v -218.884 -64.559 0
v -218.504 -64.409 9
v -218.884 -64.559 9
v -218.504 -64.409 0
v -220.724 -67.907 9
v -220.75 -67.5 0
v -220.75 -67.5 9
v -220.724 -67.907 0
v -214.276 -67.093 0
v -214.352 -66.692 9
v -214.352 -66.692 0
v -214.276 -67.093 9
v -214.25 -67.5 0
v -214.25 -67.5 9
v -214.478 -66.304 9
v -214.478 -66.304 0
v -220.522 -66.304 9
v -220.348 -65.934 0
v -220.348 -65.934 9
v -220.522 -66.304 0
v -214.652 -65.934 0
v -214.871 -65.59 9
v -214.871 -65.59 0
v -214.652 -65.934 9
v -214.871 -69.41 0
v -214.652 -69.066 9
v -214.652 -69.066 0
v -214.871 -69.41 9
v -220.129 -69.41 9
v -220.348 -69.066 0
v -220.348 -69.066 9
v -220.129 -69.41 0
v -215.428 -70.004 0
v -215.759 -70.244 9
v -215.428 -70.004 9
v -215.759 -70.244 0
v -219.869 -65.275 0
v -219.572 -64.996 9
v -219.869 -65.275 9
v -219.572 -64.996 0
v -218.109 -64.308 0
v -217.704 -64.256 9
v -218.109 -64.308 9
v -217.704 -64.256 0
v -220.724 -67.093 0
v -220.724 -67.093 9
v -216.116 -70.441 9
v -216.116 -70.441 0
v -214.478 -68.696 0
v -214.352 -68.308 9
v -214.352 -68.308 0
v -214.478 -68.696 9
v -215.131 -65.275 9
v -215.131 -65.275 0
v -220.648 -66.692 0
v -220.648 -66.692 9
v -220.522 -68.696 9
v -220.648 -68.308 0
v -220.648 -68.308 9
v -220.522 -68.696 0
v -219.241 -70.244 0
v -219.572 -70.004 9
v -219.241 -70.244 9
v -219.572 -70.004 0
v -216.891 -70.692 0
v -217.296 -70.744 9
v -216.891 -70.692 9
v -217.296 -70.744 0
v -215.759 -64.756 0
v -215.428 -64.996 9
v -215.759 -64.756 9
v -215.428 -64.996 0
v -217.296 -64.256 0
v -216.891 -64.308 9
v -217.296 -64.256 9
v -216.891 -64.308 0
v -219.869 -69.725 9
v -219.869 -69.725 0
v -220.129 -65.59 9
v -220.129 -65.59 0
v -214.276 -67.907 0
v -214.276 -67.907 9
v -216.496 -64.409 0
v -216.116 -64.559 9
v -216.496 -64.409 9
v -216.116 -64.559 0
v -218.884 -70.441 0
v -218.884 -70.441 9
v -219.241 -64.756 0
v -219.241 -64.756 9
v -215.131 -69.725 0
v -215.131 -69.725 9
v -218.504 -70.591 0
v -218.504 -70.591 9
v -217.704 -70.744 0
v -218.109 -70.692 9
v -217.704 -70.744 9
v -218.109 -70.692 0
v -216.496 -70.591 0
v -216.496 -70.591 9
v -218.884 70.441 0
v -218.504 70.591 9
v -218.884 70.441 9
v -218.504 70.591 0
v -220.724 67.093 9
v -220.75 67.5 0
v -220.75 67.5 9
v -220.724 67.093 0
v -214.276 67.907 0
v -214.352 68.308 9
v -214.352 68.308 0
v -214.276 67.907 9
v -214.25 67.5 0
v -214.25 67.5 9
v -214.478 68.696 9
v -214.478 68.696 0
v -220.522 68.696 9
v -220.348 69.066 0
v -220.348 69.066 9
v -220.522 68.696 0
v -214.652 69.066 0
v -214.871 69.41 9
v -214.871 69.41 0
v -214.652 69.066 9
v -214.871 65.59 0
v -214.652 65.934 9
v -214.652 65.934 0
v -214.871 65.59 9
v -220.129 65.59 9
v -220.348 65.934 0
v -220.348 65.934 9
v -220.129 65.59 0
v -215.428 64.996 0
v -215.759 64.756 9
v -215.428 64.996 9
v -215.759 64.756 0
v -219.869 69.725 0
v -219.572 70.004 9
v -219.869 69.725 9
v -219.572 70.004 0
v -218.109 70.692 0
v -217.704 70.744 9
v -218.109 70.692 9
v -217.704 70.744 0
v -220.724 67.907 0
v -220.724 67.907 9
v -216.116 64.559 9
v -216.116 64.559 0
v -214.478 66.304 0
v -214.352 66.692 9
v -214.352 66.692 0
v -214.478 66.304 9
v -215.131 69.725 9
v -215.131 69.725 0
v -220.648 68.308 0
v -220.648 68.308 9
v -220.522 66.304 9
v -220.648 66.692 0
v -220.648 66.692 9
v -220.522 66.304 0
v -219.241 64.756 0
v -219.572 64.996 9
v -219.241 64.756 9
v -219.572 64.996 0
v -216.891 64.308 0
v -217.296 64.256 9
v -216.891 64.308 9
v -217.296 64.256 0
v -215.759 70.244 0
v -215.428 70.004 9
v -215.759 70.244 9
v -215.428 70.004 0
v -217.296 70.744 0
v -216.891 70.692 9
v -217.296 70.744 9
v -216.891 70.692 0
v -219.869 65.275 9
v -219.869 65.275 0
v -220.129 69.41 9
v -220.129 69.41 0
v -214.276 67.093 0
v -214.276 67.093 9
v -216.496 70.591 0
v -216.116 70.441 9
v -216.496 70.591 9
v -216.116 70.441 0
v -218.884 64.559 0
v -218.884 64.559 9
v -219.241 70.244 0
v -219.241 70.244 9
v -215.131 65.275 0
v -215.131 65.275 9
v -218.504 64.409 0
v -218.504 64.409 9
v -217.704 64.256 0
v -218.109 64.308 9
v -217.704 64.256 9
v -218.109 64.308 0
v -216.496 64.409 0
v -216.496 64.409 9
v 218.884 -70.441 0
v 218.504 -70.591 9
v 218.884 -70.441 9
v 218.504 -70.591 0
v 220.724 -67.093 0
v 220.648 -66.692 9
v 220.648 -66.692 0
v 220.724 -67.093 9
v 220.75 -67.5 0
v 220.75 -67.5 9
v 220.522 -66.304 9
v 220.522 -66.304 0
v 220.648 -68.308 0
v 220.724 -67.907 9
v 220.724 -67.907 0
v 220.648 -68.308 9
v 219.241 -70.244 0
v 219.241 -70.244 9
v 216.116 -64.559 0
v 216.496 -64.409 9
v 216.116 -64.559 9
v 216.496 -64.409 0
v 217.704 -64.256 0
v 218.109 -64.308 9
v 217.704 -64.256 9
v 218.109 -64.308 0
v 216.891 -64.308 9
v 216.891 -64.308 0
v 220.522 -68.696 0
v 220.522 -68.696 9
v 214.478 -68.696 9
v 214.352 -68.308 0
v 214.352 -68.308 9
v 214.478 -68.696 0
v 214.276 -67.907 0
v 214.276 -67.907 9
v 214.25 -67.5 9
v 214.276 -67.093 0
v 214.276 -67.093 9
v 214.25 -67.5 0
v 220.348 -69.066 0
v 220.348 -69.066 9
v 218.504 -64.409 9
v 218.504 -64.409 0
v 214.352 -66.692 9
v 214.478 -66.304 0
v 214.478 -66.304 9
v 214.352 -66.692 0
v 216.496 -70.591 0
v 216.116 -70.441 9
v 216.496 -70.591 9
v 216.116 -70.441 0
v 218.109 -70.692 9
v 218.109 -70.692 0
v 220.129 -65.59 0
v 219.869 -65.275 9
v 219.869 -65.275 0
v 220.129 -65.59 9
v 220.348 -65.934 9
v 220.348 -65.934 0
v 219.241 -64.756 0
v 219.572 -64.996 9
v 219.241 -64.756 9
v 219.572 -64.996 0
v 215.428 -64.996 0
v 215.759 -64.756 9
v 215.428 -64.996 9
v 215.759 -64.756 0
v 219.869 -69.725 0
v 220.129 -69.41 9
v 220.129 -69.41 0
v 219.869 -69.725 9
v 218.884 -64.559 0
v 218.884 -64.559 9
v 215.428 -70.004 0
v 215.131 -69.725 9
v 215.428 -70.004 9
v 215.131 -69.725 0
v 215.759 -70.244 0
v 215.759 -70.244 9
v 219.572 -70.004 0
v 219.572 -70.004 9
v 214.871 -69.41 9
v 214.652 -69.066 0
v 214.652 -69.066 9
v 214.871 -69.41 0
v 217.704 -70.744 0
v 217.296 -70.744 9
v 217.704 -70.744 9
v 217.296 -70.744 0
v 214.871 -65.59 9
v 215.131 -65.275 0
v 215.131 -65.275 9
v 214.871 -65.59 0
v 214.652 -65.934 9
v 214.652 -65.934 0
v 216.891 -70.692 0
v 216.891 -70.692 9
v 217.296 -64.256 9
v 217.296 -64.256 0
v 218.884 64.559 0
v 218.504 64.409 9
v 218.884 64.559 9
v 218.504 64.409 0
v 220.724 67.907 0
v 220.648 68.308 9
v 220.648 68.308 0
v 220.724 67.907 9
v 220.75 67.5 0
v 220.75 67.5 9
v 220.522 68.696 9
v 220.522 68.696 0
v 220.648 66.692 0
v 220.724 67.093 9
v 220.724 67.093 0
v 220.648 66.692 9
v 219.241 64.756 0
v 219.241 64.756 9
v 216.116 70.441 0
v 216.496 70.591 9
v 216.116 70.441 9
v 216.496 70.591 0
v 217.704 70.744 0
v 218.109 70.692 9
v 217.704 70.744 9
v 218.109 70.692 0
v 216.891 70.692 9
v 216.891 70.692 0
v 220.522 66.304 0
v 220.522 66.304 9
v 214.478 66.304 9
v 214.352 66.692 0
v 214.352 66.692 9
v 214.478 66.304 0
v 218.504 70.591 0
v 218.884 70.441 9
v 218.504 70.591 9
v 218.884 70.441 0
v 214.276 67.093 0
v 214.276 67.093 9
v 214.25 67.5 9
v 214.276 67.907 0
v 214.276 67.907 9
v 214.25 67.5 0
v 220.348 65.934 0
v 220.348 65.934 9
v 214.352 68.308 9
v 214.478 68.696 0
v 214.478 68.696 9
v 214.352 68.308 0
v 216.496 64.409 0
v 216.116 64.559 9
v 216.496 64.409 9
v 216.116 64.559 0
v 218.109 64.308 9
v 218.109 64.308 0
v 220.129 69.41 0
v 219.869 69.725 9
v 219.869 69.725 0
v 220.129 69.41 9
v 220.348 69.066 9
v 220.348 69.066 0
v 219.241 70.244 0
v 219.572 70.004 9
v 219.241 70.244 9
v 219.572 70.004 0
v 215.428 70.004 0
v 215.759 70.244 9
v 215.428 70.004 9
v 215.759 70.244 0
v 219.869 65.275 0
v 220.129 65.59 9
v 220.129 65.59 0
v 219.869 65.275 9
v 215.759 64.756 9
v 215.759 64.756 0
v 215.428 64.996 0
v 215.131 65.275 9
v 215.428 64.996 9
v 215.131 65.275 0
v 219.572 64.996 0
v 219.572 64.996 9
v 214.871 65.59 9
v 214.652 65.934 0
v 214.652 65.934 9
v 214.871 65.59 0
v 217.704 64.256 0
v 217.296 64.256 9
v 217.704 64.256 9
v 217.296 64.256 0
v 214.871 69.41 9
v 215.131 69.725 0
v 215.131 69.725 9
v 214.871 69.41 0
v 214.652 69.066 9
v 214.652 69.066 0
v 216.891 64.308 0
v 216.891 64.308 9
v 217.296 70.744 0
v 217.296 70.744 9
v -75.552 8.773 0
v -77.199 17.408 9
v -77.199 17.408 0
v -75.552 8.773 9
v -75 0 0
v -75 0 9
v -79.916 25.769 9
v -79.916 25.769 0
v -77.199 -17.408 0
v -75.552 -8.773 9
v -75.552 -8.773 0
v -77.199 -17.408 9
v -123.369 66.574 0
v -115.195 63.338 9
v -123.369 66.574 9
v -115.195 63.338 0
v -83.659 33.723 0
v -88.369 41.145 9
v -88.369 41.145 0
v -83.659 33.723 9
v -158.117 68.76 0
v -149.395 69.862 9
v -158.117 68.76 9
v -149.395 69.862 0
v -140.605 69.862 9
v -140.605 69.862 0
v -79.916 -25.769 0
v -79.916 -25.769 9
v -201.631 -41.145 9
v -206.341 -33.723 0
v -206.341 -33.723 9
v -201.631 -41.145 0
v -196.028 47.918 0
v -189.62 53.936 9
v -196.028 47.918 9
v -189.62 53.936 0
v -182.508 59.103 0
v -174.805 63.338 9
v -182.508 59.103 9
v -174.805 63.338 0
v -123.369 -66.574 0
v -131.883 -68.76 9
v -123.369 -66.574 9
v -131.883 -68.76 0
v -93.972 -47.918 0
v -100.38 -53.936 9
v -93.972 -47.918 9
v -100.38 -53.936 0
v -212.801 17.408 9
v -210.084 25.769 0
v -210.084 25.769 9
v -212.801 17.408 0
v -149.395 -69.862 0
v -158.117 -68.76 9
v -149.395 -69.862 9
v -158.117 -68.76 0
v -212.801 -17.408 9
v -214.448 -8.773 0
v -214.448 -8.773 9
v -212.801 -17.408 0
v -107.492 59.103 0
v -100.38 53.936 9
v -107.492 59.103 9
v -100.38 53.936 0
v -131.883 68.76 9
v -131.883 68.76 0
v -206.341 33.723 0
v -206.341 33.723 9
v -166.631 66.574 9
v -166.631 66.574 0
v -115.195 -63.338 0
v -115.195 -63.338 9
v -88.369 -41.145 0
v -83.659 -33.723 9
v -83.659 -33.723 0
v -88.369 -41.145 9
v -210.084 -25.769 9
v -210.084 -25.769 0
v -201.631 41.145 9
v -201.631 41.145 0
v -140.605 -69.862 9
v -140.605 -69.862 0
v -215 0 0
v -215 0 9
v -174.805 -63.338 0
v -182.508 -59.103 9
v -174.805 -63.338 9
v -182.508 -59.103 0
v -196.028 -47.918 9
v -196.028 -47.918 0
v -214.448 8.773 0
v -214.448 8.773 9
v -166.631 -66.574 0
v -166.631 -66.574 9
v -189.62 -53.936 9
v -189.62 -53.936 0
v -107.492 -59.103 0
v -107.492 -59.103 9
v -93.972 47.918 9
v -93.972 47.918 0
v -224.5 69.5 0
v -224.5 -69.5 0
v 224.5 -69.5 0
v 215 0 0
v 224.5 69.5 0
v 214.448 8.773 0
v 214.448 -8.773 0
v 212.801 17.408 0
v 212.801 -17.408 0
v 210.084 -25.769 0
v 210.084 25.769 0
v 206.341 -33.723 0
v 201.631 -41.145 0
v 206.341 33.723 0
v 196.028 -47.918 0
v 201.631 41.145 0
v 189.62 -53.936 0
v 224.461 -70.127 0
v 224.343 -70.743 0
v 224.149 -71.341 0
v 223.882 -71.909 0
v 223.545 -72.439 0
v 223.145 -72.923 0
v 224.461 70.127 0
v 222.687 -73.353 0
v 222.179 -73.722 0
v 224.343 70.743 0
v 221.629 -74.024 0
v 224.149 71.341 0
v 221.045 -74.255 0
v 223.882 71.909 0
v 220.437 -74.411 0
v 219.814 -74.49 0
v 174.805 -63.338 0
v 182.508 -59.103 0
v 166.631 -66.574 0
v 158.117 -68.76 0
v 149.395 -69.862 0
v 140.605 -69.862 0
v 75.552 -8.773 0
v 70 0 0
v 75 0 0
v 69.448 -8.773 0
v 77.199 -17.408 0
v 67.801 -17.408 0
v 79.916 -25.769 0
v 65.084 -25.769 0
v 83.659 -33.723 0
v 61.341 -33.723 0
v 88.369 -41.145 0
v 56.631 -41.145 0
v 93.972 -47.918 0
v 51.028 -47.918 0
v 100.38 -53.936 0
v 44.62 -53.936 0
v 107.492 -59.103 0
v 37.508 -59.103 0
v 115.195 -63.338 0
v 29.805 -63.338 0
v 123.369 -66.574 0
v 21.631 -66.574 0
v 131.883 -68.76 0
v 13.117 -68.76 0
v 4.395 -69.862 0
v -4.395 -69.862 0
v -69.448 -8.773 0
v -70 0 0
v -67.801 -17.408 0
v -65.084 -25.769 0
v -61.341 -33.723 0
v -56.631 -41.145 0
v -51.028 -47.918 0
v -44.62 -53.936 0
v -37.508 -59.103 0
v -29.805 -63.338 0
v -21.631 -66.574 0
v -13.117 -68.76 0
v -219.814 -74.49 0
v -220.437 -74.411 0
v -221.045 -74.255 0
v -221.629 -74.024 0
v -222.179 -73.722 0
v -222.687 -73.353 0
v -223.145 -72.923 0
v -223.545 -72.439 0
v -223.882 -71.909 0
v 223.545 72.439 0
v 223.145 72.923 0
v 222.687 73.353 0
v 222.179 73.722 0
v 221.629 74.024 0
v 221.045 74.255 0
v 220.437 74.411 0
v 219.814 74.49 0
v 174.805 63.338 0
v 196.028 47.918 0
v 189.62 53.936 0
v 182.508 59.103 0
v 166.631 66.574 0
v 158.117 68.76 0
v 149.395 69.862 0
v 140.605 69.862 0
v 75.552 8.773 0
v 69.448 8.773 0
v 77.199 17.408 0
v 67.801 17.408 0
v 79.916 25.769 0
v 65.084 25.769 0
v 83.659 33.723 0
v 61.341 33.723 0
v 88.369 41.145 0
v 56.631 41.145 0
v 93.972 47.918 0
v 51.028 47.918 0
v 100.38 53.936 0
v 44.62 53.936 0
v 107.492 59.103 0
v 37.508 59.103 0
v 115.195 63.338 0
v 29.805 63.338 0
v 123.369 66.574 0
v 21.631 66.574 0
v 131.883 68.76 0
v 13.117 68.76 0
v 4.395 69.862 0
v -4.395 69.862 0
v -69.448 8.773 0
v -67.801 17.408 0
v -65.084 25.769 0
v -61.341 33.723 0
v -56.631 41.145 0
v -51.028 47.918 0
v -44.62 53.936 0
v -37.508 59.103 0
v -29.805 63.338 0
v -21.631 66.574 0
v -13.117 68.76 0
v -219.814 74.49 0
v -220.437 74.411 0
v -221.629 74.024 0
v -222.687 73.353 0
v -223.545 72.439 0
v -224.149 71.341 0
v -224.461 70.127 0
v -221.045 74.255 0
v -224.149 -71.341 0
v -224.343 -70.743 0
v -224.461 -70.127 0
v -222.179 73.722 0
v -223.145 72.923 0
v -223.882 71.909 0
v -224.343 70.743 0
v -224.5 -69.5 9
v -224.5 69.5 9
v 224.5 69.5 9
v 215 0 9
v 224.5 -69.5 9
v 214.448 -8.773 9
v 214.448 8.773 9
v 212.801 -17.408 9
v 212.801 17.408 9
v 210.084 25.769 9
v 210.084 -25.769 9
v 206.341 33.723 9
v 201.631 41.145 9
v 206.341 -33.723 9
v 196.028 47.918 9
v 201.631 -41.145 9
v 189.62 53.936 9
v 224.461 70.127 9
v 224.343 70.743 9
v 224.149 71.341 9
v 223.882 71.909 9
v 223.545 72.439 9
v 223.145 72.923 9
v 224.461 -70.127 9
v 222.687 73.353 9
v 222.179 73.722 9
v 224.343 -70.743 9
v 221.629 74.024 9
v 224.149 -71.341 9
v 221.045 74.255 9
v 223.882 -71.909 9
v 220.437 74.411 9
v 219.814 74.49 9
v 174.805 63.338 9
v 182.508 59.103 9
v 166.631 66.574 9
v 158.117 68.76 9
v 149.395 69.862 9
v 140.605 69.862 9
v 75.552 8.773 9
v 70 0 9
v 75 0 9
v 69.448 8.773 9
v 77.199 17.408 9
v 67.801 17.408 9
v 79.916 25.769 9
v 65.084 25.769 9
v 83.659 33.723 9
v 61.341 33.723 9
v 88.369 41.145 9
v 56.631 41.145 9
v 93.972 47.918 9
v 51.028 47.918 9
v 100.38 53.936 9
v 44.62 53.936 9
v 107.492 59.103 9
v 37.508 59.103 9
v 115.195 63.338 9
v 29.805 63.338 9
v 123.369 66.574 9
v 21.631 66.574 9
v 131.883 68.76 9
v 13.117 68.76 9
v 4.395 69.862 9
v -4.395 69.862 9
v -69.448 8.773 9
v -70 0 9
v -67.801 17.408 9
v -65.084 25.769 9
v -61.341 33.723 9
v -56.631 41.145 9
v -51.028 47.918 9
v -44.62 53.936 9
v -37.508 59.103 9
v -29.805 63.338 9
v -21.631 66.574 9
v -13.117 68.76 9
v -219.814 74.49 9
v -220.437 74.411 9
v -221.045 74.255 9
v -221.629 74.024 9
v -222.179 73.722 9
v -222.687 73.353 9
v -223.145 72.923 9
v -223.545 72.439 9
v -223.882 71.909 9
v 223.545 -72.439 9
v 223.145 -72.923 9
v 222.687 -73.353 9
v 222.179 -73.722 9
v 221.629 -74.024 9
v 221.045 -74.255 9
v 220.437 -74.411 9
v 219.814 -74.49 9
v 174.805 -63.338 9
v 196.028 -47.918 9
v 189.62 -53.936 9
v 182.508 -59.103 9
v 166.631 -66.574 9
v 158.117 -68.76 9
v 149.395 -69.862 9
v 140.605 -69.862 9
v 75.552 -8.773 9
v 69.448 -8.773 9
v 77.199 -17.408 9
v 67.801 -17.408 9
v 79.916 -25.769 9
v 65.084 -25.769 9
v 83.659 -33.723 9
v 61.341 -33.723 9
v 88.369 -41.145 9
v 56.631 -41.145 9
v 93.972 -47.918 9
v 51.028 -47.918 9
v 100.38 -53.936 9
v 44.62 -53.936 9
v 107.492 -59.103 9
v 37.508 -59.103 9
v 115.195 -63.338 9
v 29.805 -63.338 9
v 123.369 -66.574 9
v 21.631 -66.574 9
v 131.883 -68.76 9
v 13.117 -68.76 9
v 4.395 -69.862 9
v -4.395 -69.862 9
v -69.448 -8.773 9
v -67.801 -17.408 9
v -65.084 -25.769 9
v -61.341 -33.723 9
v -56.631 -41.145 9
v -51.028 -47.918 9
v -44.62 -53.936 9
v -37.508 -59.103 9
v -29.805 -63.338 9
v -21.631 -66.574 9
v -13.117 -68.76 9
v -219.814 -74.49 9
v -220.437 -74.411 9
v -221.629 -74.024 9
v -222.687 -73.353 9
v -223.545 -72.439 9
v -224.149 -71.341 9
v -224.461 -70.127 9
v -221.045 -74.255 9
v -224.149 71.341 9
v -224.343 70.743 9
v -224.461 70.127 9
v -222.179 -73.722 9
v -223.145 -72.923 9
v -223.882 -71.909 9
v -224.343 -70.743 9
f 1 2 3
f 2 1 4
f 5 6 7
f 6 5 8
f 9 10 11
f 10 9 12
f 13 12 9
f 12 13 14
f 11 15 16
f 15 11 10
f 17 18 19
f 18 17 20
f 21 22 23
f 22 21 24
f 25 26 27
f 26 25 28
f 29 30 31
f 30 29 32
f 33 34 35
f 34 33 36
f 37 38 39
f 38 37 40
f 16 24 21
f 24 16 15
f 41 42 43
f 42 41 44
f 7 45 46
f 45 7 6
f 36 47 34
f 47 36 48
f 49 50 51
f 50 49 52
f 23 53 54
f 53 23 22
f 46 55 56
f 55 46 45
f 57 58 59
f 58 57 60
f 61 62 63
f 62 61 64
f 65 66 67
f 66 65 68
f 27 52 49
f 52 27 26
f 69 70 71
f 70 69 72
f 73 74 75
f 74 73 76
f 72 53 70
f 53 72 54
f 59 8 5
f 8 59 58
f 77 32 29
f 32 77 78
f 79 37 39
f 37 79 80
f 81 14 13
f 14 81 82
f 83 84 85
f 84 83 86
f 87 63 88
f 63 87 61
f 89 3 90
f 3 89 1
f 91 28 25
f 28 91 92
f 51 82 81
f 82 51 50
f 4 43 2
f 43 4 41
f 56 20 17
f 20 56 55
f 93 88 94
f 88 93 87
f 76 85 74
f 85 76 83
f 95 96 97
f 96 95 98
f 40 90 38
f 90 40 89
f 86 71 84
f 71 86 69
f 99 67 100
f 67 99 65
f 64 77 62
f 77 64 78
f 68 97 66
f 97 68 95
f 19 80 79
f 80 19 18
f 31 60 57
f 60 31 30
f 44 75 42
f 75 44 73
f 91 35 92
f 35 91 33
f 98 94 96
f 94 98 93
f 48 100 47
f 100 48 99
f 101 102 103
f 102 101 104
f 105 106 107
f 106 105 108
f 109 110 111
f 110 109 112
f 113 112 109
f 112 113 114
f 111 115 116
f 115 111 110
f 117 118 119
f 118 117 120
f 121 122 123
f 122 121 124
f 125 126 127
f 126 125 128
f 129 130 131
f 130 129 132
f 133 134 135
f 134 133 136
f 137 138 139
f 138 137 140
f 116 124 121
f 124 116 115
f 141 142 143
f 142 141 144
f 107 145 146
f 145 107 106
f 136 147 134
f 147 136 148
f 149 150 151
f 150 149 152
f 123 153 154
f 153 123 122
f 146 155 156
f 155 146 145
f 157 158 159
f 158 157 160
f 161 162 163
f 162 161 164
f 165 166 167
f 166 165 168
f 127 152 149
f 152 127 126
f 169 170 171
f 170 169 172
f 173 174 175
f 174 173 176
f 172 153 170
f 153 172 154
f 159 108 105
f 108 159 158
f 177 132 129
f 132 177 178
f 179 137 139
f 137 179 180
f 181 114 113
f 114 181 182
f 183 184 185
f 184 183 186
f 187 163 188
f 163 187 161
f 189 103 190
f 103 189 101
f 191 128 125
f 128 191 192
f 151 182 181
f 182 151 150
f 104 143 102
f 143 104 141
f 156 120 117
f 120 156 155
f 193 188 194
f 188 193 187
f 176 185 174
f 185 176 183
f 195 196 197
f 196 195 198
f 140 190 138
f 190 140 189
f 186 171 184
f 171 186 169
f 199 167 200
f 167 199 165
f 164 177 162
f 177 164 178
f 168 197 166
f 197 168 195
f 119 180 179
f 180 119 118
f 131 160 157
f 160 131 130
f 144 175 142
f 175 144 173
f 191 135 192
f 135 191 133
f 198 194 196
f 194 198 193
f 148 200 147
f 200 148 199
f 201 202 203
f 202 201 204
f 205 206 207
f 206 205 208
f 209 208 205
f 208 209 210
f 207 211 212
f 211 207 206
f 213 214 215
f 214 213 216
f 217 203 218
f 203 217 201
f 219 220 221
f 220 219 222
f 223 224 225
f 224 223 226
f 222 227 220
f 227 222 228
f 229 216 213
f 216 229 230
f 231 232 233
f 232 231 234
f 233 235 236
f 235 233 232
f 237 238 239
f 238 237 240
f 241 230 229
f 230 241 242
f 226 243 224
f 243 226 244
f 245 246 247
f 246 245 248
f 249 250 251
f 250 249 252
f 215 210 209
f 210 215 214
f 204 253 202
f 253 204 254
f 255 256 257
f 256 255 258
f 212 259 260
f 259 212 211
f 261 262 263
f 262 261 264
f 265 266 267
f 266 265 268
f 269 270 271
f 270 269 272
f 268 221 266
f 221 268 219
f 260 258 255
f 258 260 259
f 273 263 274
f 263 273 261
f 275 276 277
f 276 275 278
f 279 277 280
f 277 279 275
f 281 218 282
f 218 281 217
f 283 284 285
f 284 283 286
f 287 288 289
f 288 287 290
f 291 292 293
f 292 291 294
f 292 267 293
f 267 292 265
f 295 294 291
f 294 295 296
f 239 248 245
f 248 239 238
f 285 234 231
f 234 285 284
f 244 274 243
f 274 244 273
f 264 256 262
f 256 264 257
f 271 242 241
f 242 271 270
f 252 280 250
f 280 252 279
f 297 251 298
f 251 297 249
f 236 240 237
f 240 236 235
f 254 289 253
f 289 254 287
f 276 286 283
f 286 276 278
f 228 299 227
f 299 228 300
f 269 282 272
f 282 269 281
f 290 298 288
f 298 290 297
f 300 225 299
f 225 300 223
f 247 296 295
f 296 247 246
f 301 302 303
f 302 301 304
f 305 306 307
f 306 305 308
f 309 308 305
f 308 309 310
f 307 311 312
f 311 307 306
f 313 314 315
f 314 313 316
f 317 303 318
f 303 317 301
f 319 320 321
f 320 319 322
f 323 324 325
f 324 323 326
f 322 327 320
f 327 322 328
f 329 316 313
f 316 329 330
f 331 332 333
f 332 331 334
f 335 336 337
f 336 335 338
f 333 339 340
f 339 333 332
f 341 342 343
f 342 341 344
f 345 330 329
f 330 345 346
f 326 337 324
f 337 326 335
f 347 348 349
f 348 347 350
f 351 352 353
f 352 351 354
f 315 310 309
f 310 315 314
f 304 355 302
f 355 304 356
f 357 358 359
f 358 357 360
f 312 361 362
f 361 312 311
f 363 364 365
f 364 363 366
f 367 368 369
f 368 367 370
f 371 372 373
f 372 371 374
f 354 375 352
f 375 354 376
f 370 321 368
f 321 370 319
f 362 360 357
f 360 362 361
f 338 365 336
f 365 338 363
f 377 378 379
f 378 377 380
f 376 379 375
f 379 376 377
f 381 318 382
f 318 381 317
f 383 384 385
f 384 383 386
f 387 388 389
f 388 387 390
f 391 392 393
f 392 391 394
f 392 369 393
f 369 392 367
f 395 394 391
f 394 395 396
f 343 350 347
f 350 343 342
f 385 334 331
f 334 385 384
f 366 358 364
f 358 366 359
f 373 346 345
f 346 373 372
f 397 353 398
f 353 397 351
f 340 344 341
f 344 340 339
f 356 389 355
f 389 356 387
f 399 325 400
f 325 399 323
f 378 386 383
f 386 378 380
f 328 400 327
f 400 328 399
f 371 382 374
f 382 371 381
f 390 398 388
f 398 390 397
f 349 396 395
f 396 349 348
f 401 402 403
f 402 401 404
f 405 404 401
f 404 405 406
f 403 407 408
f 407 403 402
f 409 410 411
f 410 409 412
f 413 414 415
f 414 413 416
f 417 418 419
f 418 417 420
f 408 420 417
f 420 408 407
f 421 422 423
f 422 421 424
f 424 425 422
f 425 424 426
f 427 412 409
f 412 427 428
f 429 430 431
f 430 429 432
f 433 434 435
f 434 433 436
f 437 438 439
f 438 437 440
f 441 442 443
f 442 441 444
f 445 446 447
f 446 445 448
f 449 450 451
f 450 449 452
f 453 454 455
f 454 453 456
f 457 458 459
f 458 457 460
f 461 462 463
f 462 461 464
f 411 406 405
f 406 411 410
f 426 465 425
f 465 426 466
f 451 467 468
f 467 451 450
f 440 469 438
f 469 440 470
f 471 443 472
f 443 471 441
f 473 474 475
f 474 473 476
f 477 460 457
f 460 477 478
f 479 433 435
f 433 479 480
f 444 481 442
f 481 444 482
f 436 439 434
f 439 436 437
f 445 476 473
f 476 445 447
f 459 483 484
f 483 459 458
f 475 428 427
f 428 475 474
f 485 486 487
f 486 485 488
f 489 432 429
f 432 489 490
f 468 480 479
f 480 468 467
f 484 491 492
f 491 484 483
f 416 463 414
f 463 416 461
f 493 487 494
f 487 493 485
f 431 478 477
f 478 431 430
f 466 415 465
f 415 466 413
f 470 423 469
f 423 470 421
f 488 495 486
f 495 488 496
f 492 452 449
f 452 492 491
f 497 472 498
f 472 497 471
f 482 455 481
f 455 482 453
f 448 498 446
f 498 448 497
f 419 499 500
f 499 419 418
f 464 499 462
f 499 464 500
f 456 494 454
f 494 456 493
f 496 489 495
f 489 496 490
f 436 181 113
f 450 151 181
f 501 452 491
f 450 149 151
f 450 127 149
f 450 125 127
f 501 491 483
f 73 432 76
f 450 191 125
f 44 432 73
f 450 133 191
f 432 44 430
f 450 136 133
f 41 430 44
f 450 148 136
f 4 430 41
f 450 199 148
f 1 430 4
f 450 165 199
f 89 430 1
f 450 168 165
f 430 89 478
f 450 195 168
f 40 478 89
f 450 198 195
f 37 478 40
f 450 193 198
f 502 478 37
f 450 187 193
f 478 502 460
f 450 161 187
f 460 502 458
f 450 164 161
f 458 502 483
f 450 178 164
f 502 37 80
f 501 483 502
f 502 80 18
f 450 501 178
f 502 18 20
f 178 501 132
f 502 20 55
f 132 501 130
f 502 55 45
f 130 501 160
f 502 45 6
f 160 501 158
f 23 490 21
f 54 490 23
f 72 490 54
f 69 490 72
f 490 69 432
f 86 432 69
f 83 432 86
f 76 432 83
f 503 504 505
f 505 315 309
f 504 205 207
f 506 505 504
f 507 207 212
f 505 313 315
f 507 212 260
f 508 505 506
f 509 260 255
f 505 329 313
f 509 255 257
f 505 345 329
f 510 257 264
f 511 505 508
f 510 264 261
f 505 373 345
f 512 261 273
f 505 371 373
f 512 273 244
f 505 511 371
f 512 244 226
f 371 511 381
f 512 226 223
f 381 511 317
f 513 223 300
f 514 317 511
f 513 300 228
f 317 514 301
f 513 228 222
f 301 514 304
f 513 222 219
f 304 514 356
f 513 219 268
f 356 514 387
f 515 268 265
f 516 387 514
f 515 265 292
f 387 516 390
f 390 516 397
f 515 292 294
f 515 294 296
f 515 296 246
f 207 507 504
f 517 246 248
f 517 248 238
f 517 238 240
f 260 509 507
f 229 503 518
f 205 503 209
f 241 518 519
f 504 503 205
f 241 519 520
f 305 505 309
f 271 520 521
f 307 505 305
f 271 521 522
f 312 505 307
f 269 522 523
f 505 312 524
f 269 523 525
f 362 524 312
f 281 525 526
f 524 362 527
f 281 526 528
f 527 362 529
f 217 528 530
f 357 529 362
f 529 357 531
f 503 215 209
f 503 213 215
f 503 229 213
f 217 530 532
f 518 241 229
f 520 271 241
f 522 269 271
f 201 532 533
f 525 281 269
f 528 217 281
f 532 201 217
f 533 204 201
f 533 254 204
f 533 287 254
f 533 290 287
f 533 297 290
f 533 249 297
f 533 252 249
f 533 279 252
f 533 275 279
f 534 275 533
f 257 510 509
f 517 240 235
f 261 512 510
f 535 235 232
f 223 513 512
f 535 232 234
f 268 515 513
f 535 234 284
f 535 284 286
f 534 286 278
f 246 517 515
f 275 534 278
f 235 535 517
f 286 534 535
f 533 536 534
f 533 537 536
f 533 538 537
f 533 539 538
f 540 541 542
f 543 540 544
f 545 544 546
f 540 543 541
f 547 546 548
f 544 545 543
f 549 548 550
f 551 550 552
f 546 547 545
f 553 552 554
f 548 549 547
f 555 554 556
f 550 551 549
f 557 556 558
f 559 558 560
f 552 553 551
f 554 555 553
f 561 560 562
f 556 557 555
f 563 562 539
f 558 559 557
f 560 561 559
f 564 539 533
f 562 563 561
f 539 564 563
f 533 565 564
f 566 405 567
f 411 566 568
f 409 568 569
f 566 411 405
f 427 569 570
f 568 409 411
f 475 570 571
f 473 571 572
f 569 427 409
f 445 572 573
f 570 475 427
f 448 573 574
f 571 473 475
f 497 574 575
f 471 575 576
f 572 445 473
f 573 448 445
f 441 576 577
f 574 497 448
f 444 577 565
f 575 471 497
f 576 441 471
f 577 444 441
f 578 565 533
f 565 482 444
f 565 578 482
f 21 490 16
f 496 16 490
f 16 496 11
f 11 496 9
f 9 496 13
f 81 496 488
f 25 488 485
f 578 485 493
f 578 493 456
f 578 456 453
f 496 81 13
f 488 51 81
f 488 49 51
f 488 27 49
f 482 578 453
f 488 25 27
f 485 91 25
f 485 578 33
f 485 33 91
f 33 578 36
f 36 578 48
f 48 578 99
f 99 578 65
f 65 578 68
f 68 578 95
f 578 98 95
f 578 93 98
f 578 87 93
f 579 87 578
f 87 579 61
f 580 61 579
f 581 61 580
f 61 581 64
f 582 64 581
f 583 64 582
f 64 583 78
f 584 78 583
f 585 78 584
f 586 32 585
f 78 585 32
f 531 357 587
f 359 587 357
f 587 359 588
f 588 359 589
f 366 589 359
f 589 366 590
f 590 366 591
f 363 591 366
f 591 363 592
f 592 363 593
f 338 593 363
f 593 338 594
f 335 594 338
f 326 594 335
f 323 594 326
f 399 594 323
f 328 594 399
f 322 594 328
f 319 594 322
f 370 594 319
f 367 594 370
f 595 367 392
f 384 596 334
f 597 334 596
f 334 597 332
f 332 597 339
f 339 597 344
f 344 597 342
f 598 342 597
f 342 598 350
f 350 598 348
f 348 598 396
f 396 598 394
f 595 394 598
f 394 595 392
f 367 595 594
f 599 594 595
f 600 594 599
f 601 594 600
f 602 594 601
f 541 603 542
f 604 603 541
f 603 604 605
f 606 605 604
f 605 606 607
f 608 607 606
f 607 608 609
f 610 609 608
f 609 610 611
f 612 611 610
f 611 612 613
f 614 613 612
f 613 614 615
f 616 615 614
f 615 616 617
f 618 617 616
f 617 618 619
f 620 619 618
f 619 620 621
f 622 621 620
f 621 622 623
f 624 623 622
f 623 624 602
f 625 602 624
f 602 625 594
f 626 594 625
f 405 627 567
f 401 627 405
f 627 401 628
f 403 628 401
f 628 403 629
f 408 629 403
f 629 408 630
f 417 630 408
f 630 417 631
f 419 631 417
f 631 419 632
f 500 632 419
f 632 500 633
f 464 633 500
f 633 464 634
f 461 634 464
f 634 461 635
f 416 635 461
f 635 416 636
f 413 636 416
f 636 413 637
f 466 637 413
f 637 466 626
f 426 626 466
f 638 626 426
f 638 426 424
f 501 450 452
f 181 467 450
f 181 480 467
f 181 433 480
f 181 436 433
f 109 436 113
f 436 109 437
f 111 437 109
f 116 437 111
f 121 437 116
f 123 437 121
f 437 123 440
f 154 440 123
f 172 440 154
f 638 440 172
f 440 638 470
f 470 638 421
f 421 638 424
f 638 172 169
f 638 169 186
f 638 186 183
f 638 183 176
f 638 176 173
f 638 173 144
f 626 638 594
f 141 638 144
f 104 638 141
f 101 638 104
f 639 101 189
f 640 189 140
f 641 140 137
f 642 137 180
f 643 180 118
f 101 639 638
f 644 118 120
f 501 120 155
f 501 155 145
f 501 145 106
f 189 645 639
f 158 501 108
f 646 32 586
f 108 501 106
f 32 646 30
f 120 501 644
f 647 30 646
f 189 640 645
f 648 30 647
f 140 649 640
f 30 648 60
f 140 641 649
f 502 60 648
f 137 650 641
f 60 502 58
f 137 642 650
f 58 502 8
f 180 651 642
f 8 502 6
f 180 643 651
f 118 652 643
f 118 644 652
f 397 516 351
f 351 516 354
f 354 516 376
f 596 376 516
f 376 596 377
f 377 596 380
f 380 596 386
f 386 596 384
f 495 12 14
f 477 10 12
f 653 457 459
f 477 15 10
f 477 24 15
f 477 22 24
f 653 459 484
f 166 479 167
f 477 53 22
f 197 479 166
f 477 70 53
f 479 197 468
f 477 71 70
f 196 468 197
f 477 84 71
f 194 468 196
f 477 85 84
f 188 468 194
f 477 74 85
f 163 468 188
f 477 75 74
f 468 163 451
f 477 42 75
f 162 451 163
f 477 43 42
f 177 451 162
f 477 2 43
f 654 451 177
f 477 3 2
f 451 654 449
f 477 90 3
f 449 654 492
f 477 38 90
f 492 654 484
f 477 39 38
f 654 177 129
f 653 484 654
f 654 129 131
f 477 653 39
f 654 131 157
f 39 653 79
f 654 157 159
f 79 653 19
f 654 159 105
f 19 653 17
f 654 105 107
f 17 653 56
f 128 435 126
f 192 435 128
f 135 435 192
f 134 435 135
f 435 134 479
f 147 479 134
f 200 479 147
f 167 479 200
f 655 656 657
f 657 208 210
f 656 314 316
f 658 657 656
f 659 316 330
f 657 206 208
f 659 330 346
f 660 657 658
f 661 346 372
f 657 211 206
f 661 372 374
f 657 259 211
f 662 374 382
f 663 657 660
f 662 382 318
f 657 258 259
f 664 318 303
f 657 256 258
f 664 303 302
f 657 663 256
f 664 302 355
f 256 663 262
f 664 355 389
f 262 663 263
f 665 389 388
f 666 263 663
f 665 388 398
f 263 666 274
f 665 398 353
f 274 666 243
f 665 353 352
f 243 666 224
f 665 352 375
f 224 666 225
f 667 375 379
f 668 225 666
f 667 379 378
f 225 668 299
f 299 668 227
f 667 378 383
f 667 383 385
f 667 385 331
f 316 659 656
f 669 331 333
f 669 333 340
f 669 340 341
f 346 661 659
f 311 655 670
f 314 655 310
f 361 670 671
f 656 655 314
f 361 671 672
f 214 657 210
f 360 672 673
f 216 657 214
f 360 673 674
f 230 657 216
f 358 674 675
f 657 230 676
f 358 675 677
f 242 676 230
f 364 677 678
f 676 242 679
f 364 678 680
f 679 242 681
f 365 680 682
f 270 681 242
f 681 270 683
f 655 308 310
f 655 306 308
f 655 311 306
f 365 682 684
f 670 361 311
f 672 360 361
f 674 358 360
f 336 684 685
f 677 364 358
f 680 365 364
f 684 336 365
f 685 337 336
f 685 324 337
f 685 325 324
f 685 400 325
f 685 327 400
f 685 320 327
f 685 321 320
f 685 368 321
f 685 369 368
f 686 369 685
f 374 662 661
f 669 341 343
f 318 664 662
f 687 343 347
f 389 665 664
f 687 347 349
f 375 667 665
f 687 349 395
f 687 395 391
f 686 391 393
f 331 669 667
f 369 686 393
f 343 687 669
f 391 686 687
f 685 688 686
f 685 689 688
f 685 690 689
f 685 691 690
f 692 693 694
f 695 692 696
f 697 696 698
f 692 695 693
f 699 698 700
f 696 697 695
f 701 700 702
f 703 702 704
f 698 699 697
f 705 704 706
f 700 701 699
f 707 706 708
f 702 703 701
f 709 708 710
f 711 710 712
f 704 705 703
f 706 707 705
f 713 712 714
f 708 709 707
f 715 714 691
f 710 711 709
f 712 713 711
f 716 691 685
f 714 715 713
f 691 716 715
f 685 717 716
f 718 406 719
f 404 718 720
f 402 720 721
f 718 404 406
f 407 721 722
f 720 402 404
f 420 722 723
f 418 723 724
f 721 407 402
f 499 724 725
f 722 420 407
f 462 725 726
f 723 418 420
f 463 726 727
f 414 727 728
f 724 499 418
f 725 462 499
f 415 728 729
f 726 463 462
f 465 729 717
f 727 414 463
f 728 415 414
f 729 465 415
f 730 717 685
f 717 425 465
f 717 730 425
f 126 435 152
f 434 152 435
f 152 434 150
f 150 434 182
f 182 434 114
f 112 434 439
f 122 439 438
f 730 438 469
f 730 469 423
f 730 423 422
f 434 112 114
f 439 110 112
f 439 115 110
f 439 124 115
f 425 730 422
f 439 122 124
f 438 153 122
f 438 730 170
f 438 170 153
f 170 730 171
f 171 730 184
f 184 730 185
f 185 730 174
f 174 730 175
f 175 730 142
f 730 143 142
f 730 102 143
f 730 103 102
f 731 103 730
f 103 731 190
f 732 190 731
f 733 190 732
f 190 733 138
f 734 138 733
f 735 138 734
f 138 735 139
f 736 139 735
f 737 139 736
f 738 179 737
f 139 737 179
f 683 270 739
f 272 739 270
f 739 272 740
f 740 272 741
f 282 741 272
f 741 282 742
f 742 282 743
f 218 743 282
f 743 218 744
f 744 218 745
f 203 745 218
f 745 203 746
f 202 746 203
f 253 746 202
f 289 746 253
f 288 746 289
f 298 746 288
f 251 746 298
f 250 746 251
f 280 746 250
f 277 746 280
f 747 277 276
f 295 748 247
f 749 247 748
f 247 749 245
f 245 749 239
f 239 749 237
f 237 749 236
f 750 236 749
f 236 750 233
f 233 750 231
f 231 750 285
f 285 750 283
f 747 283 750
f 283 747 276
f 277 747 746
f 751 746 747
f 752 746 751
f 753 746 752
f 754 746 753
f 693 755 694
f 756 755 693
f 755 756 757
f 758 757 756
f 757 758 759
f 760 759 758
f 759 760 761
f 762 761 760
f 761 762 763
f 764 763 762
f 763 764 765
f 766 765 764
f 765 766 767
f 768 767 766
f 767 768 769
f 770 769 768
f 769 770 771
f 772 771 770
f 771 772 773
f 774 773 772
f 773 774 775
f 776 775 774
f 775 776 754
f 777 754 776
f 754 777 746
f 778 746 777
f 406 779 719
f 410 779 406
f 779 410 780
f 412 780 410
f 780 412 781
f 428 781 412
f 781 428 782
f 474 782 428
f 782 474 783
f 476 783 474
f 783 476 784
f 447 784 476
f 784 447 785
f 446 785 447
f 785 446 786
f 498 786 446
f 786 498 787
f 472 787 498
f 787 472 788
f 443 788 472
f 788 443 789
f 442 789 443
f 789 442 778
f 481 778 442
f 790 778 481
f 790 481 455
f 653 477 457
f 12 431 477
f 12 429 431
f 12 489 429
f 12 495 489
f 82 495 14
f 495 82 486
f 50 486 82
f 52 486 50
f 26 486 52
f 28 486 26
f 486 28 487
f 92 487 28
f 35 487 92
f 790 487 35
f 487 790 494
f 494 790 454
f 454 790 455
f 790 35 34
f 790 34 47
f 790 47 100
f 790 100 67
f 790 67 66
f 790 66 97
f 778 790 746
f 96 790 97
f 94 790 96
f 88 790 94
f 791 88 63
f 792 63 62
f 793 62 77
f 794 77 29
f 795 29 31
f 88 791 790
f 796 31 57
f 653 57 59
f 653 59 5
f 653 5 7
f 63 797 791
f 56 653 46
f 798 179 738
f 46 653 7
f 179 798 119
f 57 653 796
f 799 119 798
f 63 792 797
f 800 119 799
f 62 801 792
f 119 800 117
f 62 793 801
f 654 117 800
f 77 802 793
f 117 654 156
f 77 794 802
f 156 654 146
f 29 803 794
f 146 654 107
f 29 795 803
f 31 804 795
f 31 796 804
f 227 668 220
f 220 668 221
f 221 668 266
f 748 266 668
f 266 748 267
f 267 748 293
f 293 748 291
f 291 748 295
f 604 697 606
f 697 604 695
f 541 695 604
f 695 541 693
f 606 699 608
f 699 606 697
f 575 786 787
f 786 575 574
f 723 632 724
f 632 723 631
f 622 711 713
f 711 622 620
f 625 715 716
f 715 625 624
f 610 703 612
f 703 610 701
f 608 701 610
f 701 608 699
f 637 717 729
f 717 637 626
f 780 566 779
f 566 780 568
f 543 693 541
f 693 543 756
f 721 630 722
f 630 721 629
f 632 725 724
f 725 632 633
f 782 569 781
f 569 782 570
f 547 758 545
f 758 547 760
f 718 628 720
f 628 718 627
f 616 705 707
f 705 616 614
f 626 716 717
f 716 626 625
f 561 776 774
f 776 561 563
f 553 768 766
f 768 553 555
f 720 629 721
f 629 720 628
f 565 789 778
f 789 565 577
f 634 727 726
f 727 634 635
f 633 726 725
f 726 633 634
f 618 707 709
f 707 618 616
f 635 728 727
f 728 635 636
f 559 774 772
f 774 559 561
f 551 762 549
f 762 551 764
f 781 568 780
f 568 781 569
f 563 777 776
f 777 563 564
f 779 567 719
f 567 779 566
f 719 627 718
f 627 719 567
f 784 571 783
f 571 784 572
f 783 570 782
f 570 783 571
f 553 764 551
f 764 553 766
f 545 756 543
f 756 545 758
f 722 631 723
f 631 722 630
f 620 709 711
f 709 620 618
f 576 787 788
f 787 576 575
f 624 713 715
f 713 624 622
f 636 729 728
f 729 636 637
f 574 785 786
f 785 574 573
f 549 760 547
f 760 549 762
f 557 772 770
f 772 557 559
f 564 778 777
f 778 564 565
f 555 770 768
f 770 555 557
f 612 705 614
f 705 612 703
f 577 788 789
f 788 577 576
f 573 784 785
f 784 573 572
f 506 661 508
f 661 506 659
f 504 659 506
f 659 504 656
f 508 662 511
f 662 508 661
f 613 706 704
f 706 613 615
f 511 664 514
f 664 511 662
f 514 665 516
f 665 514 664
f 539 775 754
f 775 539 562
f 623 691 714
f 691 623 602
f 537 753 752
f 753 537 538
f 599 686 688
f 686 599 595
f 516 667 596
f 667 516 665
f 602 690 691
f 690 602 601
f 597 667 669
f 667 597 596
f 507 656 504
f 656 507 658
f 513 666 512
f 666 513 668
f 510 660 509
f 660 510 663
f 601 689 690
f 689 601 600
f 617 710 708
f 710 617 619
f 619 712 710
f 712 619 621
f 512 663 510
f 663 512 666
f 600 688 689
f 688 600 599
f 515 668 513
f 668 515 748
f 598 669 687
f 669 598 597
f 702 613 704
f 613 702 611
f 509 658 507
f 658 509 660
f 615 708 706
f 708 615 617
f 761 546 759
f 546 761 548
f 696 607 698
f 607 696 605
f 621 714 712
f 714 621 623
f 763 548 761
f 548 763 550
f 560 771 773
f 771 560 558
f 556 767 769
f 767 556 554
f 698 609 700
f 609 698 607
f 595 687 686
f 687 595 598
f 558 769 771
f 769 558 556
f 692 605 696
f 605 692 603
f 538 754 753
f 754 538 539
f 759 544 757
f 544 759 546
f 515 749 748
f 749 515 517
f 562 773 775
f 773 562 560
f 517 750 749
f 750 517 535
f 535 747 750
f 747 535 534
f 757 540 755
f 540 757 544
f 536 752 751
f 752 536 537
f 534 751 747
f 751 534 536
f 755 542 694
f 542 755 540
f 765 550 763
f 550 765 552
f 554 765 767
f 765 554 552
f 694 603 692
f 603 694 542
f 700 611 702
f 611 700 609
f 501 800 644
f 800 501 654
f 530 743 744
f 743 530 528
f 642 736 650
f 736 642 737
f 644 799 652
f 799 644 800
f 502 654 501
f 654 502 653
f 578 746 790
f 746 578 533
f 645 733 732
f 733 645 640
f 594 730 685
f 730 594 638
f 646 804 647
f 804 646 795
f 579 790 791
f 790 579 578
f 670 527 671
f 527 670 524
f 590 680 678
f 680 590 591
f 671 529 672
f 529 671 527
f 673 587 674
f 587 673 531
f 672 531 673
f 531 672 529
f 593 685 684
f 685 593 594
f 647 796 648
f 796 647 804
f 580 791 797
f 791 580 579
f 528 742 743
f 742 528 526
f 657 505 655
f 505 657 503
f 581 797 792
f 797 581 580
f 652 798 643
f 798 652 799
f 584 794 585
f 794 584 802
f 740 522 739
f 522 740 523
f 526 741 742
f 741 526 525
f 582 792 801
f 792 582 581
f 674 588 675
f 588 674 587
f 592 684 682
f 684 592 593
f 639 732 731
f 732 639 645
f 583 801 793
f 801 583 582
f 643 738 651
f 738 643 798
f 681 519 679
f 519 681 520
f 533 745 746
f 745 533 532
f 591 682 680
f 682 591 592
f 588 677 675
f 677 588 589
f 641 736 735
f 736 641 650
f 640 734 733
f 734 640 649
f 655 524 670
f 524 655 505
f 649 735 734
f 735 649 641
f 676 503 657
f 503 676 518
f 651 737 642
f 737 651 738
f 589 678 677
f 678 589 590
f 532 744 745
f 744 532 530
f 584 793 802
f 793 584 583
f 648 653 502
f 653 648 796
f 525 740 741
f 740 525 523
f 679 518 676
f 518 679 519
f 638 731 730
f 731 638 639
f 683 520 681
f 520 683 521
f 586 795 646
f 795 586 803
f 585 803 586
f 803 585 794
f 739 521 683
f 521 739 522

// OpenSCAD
$fn = 50;

difference() {
	union() {
		hull() {
			translate(v = [-219.5, 69.5, 0]) {
				cylinder(h = 9, r = 5);
			}
			translate(v = [219.5, 69.5, 0]) {
				cylinder(h = 9, r = 5);
			}
			translate(v = [-219.5, -69.5, 0]) {
				cylinder(h = 9, r = 5);
			}
			translate(v = [219.5, -69.5, 0]) {
				cylinder(h = 9, r = 5);
			}
		}
	}
	union() {
		translate(v = [-217.5, -67.5, -100.0]) {
			cylinder(h = 200, r = 3.25);
		}
		translate(v = [-217.5, 67.5, -100.0]) {
			cylinder(h = 200, r = 3.25);
		}
		translate(v = [217.5, -67.5, -100.0]) {
			cylinder(h = 200, r = 3.25);
		}
		translate(v = [217.5, 67.5, -100.0]) {
			cylinder(h = 200, r = 3.25);
		}
		translate(v = [-217.5, -67.5, -100.0]) {
			cylinder(h = 200, r = 1.8);
		}
		translate(v = [-217.5, 67.5, -100.0]) {
			cylinder(h = 200, r = 1.8);
		}
		translate(v = [217.5, -67.5, -100.0]) {
			cylinder(h = 200, r = 1.8);
		}
		translate(v = [217.5, 67.5, -100.0]) {
			cylinder(h = 200, r = 1.8);
		}
		translate(v = [-145.0, 0, 0.0]) {
			cylinder(h = 9, r = 70.0);
		}
		cylinder(h = 9, r = 70.0);
		translate(v = [145.0, 0, 0.0]) {
			cylinder(h = 9, r = 70.0);
		}
	}
}
